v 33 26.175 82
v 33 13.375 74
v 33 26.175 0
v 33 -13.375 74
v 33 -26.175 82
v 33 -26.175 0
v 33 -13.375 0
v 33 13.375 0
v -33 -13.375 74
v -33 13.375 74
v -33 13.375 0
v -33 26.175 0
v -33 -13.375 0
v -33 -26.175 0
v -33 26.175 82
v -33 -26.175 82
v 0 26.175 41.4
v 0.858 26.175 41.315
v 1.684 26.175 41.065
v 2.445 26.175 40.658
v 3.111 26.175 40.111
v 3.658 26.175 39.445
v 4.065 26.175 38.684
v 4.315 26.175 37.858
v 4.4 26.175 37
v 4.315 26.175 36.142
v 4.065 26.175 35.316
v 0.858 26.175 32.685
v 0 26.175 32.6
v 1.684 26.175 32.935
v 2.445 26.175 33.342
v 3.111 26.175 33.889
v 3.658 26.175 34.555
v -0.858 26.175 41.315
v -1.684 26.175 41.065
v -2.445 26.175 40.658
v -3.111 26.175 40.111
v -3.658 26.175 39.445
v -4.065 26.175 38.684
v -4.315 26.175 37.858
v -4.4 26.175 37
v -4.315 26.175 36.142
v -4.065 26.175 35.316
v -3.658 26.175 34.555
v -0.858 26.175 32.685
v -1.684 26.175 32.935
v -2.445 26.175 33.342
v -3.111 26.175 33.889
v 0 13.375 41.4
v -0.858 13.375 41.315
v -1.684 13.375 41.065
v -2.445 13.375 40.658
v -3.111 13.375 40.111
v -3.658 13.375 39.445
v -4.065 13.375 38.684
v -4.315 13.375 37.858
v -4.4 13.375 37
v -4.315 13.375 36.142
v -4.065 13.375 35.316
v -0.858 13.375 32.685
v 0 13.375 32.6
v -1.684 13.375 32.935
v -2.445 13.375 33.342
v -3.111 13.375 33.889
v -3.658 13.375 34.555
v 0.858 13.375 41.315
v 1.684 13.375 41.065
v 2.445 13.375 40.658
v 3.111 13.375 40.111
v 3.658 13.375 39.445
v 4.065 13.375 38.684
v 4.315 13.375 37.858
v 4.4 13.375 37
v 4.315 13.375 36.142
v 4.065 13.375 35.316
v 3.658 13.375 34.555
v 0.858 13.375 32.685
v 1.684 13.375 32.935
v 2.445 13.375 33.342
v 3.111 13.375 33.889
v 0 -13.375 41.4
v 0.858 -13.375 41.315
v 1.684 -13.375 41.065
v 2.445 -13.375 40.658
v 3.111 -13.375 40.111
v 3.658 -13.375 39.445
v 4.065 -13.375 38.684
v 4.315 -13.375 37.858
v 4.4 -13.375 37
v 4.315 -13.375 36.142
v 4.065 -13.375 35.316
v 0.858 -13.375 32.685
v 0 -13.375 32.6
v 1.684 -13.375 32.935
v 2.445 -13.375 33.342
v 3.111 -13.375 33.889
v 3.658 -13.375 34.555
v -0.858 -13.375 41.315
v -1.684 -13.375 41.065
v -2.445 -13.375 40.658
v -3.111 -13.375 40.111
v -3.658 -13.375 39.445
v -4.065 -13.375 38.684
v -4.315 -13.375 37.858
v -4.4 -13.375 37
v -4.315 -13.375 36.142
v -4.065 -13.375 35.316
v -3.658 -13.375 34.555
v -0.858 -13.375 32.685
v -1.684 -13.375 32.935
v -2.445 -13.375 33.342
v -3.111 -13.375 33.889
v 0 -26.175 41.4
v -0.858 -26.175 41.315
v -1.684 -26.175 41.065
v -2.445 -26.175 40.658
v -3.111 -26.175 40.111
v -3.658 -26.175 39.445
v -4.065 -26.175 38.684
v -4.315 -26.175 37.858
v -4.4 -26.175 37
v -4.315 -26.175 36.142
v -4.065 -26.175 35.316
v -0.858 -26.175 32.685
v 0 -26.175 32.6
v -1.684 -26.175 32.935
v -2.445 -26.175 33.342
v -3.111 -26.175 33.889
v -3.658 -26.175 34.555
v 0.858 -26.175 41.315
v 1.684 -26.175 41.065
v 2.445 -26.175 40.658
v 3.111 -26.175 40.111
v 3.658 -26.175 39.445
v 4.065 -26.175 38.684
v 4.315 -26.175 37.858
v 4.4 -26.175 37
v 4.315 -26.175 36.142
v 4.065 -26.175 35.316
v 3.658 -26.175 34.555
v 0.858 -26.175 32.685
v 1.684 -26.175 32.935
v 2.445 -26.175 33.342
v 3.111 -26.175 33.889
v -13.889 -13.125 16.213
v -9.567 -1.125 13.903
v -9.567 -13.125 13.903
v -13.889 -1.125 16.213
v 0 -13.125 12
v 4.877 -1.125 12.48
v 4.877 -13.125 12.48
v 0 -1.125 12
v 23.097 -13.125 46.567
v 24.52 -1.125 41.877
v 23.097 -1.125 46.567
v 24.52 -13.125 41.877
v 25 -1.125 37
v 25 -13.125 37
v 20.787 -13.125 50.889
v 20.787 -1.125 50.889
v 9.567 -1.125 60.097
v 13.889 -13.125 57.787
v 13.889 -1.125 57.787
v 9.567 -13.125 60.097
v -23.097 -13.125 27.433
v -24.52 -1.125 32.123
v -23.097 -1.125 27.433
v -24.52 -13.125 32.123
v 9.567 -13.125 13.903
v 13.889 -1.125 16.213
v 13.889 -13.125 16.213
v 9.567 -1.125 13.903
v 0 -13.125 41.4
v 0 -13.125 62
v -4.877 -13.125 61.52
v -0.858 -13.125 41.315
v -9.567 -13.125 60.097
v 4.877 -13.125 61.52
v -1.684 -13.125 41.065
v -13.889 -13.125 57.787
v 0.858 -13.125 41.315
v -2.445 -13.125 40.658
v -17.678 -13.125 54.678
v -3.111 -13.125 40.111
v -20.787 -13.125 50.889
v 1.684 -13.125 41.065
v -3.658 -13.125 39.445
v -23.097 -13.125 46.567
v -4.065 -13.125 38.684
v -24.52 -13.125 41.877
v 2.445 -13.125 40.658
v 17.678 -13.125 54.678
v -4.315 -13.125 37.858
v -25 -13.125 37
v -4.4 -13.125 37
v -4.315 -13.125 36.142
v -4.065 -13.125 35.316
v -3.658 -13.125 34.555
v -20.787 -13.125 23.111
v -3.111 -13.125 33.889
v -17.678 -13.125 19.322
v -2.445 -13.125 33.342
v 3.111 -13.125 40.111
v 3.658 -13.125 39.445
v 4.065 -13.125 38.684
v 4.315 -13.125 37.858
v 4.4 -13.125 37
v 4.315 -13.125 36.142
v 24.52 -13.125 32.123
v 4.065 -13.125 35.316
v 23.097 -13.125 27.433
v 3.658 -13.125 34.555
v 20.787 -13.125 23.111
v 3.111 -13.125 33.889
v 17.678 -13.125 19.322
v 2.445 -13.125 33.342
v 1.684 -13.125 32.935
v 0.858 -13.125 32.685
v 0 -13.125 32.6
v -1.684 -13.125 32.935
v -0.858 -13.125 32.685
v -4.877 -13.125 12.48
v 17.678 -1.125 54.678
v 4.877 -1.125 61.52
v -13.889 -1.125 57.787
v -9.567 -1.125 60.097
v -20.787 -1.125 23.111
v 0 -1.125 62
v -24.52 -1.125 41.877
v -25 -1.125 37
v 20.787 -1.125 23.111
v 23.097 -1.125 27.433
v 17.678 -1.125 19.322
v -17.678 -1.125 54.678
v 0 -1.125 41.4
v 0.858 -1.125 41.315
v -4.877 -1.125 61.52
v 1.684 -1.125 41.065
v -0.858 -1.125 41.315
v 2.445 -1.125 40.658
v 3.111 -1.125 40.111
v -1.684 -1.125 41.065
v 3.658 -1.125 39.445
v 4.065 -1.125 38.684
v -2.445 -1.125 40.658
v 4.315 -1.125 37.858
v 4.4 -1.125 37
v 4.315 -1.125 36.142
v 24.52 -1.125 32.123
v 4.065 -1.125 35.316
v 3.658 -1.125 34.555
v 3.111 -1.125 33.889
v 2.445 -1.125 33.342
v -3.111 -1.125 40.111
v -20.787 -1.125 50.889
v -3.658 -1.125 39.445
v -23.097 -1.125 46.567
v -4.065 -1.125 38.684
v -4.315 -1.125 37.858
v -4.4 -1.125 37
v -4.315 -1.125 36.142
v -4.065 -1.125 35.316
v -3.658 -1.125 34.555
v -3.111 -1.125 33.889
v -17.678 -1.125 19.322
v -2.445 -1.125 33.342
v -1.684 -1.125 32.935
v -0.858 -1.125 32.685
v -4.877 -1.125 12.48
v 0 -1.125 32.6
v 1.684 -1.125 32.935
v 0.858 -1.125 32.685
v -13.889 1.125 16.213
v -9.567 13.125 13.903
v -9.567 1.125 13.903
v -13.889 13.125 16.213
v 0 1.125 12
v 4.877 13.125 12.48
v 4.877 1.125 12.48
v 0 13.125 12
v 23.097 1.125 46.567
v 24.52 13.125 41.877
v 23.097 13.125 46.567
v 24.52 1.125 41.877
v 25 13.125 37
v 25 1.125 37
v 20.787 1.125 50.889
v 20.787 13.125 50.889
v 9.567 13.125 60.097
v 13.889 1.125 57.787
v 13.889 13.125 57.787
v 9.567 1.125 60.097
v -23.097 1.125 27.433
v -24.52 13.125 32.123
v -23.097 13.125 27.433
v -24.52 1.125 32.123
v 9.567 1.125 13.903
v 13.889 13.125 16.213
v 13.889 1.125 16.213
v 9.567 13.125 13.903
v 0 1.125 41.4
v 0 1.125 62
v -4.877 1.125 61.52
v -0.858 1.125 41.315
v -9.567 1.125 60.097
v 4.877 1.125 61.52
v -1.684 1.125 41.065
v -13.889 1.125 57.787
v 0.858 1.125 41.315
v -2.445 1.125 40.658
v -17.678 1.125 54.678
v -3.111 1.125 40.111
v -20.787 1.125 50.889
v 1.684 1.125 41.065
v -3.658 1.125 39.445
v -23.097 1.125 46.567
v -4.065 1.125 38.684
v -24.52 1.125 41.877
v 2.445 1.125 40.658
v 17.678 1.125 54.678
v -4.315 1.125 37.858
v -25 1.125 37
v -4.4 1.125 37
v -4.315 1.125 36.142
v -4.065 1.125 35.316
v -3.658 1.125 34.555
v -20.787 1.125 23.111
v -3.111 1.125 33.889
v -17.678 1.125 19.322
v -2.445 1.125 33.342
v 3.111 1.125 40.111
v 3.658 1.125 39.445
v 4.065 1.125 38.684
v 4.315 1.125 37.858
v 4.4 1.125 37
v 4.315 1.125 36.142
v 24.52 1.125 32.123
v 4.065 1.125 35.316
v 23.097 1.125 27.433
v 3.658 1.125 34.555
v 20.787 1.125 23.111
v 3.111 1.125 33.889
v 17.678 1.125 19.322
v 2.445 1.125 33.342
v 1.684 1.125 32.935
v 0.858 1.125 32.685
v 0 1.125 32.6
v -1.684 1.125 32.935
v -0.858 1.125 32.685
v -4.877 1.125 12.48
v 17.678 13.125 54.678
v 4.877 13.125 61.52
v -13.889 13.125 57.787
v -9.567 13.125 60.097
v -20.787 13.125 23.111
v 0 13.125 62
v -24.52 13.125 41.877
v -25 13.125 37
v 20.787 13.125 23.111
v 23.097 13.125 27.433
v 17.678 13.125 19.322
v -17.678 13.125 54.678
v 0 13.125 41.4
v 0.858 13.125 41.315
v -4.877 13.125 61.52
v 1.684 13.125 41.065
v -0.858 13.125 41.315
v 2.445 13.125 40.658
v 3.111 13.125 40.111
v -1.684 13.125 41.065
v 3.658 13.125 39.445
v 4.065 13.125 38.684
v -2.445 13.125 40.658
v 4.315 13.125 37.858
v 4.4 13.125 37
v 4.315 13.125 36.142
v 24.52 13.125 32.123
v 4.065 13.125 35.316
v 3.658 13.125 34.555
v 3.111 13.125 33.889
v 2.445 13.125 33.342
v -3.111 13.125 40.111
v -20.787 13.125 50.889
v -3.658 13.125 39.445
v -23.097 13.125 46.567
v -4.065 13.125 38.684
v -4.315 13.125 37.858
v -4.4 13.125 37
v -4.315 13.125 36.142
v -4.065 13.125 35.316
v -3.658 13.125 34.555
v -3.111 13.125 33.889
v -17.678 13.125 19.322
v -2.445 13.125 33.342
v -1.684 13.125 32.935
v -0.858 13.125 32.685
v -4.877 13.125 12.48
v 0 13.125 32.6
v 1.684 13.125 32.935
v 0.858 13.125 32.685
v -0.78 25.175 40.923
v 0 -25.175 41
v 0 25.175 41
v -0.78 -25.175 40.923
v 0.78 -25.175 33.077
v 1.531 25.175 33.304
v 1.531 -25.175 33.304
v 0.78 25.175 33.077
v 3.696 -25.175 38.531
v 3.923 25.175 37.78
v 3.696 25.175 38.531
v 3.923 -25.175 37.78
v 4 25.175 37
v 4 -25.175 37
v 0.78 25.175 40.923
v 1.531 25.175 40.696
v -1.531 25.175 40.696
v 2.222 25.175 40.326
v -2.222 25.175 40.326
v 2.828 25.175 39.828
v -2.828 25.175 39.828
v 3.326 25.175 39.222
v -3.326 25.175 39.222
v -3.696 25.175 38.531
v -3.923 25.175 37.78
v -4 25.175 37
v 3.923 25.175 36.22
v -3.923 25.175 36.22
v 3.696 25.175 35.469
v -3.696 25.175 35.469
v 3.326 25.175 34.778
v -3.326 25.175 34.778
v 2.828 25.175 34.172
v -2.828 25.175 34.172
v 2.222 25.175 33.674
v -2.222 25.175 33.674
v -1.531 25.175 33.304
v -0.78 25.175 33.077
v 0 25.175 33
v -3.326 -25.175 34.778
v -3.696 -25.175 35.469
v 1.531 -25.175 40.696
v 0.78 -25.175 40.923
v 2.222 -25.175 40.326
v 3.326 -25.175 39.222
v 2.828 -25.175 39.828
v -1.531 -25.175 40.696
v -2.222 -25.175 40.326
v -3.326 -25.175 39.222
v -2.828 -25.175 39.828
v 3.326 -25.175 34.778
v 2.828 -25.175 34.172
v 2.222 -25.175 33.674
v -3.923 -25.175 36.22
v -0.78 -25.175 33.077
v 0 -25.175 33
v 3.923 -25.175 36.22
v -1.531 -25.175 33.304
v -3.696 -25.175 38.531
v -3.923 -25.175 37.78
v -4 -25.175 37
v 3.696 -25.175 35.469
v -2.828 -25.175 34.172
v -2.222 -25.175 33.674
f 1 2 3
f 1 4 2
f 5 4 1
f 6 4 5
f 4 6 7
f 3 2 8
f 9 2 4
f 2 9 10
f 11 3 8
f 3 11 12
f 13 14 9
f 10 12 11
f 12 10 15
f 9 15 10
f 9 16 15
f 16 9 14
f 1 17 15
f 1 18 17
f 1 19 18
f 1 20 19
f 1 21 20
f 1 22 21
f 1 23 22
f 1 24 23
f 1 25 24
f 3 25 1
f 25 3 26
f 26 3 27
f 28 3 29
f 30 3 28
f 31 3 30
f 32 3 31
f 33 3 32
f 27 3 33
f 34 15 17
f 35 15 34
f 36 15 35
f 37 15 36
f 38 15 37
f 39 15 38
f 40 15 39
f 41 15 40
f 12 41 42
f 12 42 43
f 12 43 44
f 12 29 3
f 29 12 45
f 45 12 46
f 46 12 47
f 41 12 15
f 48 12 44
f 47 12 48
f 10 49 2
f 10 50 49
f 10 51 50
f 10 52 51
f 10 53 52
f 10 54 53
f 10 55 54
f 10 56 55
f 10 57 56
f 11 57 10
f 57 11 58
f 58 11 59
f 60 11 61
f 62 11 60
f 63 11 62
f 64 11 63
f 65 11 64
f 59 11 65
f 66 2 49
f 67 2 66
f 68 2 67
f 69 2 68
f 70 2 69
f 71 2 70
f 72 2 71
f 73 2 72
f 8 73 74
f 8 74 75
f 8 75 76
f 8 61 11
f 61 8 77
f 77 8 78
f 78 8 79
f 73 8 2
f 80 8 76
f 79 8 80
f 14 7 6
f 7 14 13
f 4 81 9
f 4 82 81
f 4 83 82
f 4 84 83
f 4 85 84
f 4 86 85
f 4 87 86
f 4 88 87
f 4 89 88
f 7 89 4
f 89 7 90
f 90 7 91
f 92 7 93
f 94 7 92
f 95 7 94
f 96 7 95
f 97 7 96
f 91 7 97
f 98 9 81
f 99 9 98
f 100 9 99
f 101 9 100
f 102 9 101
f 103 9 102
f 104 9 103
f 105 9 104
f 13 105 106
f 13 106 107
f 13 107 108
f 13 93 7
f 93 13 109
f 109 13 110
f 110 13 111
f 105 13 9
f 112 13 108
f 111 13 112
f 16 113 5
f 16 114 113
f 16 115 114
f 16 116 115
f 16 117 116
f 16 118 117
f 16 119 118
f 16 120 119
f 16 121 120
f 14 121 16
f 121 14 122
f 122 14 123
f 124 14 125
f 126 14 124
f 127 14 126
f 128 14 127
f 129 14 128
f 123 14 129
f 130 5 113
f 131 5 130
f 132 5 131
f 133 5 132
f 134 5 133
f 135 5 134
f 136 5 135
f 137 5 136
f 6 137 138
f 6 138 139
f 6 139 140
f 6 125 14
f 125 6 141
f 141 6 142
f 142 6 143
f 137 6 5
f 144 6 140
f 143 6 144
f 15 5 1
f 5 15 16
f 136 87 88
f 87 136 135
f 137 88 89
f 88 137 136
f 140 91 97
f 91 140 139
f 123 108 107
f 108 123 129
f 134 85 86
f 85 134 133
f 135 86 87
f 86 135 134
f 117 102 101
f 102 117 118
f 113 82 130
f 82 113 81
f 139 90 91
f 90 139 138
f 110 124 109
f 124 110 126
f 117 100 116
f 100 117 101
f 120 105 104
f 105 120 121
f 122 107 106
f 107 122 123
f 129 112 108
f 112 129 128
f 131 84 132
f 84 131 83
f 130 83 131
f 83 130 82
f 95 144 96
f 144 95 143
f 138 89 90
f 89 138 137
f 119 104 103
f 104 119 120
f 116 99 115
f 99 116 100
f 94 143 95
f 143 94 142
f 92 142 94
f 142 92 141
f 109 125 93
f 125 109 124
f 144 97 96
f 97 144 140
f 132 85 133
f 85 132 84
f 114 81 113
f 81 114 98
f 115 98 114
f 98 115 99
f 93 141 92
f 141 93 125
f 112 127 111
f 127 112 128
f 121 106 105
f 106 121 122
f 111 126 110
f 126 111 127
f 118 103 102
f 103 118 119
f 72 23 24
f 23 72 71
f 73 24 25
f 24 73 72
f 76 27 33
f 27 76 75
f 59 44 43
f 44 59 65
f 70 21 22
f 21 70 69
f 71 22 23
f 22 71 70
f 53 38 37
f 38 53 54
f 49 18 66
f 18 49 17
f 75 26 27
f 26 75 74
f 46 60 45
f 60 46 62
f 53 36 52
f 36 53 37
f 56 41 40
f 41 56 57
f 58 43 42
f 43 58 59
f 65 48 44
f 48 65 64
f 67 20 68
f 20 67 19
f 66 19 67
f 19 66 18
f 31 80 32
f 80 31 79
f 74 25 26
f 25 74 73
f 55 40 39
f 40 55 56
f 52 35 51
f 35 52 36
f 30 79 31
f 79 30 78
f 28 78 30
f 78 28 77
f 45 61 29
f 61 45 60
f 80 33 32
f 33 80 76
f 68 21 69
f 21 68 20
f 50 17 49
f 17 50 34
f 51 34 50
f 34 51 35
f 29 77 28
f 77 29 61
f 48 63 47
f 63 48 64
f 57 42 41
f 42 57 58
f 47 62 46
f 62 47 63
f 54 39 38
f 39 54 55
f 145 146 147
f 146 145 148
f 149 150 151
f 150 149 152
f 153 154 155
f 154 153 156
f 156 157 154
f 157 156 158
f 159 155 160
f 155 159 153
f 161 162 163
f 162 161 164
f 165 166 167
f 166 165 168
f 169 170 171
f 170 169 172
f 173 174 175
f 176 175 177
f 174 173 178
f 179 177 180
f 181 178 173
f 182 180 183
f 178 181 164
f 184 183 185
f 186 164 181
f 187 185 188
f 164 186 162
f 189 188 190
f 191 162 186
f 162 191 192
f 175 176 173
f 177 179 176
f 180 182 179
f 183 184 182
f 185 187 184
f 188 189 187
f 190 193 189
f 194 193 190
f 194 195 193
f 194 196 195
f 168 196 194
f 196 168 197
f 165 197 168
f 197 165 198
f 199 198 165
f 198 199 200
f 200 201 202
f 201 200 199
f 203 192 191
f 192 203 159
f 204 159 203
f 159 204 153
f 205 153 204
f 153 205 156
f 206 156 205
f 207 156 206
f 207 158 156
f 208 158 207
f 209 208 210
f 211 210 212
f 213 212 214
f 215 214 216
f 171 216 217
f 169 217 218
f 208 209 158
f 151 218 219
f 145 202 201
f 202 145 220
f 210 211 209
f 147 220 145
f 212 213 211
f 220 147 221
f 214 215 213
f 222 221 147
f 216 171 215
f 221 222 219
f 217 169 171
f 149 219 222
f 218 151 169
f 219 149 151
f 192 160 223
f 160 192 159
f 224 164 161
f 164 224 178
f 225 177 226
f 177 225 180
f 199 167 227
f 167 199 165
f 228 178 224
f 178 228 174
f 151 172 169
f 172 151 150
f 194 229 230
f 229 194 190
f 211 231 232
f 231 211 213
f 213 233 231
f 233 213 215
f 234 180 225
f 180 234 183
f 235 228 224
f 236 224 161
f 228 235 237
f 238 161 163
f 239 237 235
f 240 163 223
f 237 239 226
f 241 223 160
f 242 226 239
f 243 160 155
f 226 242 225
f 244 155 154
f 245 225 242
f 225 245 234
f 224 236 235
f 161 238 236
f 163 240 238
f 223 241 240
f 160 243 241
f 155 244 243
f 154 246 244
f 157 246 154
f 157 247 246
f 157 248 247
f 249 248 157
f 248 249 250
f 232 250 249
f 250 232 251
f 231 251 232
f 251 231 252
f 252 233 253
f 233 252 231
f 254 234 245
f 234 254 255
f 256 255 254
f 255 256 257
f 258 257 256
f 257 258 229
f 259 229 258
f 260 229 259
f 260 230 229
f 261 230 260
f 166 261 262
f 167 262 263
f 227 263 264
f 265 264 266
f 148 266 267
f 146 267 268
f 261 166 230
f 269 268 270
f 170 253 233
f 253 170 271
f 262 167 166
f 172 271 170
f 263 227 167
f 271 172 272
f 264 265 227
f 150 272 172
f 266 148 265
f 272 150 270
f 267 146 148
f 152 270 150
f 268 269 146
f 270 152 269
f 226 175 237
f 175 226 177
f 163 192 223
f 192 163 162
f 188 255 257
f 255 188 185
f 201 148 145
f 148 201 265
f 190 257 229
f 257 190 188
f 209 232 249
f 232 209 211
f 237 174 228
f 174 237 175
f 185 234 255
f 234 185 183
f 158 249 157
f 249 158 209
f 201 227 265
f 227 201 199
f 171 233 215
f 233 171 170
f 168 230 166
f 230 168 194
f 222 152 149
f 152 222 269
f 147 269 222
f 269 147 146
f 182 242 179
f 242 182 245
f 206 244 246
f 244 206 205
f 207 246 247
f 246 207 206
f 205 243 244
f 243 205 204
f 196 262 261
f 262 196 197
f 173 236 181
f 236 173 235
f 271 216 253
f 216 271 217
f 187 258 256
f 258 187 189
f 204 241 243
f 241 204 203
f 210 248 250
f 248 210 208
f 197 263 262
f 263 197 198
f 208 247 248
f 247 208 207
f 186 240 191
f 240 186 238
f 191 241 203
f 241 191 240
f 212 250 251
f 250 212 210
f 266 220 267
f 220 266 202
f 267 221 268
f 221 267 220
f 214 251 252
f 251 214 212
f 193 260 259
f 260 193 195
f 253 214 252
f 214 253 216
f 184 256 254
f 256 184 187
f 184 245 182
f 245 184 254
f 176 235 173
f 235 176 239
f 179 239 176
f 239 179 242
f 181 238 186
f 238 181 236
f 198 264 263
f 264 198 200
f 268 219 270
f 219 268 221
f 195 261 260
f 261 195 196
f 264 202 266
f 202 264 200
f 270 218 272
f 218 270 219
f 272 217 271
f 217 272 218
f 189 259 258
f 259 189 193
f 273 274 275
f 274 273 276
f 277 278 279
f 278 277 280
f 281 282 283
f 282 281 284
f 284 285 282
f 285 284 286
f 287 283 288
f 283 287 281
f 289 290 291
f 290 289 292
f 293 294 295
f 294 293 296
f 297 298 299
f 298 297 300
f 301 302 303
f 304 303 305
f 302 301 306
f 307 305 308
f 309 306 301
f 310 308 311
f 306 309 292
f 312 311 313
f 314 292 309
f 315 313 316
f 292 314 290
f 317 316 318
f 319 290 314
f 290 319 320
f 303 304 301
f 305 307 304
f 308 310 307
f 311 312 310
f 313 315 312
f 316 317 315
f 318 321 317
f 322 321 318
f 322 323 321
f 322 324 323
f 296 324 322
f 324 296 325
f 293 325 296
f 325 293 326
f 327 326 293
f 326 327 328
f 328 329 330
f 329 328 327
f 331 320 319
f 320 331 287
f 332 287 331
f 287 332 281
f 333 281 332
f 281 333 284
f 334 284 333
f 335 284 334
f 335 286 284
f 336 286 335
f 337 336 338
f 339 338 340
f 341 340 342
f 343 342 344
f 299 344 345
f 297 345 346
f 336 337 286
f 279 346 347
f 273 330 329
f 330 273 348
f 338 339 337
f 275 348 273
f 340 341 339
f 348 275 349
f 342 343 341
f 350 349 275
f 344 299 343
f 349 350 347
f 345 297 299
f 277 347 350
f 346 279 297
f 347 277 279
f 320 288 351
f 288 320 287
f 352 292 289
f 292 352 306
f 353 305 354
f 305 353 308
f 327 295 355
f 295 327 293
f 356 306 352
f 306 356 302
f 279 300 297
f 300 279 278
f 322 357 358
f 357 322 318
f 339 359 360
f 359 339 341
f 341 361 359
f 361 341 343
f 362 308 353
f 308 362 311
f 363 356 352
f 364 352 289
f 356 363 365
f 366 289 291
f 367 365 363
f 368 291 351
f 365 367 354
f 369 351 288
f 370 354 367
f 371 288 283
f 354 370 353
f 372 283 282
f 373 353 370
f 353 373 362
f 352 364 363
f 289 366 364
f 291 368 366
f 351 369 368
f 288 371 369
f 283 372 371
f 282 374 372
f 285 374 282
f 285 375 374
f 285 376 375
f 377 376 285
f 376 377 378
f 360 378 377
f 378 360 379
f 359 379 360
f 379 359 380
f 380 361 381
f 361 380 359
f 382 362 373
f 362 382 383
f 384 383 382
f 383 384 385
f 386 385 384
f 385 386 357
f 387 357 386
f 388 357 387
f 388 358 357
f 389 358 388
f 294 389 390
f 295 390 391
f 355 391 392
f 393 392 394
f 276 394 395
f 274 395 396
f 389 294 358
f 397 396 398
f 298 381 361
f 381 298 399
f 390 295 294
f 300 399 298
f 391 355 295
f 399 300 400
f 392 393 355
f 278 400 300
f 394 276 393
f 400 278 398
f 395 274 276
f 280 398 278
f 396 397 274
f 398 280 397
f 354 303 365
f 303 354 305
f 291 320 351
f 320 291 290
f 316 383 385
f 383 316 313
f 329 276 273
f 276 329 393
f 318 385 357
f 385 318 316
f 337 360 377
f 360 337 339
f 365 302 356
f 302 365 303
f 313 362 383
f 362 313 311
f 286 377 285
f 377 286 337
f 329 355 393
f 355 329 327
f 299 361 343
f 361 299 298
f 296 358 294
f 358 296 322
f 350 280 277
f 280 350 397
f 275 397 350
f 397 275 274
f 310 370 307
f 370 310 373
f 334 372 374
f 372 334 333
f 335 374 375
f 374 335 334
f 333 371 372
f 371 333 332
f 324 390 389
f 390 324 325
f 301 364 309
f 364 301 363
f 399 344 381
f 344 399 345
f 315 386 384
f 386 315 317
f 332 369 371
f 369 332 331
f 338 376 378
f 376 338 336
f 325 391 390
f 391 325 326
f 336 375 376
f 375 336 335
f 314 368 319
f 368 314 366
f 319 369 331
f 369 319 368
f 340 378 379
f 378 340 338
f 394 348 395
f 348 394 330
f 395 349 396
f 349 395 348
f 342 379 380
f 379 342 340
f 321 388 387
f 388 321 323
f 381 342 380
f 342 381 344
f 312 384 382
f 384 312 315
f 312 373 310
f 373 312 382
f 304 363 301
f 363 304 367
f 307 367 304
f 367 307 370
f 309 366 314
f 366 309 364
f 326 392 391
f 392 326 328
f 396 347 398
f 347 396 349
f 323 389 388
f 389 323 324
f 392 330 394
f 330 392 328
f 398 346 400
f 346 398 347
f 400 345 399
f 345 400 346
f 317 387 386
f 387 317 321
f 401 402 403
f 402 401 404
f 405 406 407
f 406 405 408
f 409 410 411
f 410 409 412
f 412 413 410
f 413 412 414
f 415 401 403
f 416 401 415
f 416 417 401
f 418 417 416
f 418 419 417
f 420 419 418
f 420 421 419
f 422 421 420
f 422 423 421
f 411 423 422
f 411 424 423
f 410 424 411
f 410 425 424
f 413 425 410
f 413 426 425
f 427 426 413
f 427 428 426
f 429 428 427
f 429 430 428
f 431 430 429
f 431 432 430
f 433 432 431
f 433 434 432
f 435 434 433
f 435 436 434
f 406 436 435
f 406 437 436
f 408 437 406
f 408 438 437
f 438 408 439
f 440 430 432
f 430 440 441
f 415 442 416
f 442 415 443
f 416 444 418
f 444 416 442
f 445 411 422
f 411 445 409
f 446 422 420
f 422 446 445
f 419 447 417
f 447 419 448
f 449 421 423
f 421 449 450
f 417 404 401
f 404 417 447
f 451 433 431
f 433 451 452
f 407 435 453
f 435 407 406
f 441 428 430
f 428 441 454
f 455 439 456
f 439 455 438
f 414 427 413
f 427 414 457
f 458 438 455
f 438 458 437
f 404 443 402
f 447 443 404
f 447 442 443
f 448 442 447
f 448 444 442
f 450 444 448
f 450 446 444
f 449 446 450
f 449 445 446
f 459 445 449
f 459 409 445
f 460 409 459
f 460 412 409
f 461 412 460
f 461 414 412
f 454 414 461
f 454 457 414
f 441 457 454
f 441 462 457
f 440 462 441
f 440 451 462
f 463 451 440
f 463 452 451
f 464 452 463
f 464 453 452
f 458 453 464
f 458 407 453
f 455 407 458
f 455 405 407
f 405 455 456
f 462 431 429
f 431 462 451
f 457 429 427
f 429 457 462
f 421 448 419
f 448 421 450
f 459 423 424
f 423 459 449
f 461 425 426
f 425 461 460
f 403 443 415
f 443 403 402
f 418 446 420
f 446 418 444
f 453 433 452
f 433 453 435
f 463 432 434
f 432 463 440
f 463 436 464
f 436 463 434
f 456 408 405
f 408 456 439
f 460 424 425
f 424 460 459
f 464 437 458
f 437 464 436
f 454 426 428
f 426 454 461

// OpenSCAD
$fn = 32;

// ------------------------------------------------------------------------
// Trolley wheel set: wheels d50, fork 74 mm tall
// Every part is its own module, assembly() places every instance.
// ------------------------------------------------------------------------

// --- part 1 ---
module trolley_fork() {
  difference() {
    union() {
      translate([-33, 13.375, 0]) cube([66, 12.8, 74]);
      translate([-33, -26.175, 0]) cube([66, 12.8, 74]);
      translate([-33, -26.175, 74]) cube([66, 52.35, 8]);
    }
    translate([0, -19.775, 37]) rotate([90, 0, 0]) cylinder(h = 14.8, d = 8.8, center = true);
    translate([0, 19.775, 37]) rotate([90, 0, 0]) cylinder(h = 14.8, d = 8.8, center = true);
  }
}

// --- part 2 ---
module trolley_wheel() {
  difference() {
      translate([0, 0, 0]) cylinder(h = 12, d = 50);
      translate([0, 0, -1]) cylinder(h = 14, d = 8.8);
    }
}

// --- part 3 ---
module trolley_axle() {
  translate([0, 0, -25.175]) cylinder(h = 50.35, d = 8);
}

// --- assembly ---
module assembly() {
  color([0.80, 0.24, 0.20]) translate([0, 0, 0]) rotate([0, 0, 0]) trolley_fork();
  color([0.20, 0.45, 0.75]) translate([0, -1.125, 37]) rotate([90, 0, 0]) trolley_wheel();
  color([0.25, 0.62, 0.32]) translate([0, 13.125, 37]) rotate([90, 0, 0]) trolley_wheel();
  color([0.92, 0.70, 0.18]) translate([0, 0, 37]) rotate([90, 0, 0]) trolley_axle();
}

assembly();
